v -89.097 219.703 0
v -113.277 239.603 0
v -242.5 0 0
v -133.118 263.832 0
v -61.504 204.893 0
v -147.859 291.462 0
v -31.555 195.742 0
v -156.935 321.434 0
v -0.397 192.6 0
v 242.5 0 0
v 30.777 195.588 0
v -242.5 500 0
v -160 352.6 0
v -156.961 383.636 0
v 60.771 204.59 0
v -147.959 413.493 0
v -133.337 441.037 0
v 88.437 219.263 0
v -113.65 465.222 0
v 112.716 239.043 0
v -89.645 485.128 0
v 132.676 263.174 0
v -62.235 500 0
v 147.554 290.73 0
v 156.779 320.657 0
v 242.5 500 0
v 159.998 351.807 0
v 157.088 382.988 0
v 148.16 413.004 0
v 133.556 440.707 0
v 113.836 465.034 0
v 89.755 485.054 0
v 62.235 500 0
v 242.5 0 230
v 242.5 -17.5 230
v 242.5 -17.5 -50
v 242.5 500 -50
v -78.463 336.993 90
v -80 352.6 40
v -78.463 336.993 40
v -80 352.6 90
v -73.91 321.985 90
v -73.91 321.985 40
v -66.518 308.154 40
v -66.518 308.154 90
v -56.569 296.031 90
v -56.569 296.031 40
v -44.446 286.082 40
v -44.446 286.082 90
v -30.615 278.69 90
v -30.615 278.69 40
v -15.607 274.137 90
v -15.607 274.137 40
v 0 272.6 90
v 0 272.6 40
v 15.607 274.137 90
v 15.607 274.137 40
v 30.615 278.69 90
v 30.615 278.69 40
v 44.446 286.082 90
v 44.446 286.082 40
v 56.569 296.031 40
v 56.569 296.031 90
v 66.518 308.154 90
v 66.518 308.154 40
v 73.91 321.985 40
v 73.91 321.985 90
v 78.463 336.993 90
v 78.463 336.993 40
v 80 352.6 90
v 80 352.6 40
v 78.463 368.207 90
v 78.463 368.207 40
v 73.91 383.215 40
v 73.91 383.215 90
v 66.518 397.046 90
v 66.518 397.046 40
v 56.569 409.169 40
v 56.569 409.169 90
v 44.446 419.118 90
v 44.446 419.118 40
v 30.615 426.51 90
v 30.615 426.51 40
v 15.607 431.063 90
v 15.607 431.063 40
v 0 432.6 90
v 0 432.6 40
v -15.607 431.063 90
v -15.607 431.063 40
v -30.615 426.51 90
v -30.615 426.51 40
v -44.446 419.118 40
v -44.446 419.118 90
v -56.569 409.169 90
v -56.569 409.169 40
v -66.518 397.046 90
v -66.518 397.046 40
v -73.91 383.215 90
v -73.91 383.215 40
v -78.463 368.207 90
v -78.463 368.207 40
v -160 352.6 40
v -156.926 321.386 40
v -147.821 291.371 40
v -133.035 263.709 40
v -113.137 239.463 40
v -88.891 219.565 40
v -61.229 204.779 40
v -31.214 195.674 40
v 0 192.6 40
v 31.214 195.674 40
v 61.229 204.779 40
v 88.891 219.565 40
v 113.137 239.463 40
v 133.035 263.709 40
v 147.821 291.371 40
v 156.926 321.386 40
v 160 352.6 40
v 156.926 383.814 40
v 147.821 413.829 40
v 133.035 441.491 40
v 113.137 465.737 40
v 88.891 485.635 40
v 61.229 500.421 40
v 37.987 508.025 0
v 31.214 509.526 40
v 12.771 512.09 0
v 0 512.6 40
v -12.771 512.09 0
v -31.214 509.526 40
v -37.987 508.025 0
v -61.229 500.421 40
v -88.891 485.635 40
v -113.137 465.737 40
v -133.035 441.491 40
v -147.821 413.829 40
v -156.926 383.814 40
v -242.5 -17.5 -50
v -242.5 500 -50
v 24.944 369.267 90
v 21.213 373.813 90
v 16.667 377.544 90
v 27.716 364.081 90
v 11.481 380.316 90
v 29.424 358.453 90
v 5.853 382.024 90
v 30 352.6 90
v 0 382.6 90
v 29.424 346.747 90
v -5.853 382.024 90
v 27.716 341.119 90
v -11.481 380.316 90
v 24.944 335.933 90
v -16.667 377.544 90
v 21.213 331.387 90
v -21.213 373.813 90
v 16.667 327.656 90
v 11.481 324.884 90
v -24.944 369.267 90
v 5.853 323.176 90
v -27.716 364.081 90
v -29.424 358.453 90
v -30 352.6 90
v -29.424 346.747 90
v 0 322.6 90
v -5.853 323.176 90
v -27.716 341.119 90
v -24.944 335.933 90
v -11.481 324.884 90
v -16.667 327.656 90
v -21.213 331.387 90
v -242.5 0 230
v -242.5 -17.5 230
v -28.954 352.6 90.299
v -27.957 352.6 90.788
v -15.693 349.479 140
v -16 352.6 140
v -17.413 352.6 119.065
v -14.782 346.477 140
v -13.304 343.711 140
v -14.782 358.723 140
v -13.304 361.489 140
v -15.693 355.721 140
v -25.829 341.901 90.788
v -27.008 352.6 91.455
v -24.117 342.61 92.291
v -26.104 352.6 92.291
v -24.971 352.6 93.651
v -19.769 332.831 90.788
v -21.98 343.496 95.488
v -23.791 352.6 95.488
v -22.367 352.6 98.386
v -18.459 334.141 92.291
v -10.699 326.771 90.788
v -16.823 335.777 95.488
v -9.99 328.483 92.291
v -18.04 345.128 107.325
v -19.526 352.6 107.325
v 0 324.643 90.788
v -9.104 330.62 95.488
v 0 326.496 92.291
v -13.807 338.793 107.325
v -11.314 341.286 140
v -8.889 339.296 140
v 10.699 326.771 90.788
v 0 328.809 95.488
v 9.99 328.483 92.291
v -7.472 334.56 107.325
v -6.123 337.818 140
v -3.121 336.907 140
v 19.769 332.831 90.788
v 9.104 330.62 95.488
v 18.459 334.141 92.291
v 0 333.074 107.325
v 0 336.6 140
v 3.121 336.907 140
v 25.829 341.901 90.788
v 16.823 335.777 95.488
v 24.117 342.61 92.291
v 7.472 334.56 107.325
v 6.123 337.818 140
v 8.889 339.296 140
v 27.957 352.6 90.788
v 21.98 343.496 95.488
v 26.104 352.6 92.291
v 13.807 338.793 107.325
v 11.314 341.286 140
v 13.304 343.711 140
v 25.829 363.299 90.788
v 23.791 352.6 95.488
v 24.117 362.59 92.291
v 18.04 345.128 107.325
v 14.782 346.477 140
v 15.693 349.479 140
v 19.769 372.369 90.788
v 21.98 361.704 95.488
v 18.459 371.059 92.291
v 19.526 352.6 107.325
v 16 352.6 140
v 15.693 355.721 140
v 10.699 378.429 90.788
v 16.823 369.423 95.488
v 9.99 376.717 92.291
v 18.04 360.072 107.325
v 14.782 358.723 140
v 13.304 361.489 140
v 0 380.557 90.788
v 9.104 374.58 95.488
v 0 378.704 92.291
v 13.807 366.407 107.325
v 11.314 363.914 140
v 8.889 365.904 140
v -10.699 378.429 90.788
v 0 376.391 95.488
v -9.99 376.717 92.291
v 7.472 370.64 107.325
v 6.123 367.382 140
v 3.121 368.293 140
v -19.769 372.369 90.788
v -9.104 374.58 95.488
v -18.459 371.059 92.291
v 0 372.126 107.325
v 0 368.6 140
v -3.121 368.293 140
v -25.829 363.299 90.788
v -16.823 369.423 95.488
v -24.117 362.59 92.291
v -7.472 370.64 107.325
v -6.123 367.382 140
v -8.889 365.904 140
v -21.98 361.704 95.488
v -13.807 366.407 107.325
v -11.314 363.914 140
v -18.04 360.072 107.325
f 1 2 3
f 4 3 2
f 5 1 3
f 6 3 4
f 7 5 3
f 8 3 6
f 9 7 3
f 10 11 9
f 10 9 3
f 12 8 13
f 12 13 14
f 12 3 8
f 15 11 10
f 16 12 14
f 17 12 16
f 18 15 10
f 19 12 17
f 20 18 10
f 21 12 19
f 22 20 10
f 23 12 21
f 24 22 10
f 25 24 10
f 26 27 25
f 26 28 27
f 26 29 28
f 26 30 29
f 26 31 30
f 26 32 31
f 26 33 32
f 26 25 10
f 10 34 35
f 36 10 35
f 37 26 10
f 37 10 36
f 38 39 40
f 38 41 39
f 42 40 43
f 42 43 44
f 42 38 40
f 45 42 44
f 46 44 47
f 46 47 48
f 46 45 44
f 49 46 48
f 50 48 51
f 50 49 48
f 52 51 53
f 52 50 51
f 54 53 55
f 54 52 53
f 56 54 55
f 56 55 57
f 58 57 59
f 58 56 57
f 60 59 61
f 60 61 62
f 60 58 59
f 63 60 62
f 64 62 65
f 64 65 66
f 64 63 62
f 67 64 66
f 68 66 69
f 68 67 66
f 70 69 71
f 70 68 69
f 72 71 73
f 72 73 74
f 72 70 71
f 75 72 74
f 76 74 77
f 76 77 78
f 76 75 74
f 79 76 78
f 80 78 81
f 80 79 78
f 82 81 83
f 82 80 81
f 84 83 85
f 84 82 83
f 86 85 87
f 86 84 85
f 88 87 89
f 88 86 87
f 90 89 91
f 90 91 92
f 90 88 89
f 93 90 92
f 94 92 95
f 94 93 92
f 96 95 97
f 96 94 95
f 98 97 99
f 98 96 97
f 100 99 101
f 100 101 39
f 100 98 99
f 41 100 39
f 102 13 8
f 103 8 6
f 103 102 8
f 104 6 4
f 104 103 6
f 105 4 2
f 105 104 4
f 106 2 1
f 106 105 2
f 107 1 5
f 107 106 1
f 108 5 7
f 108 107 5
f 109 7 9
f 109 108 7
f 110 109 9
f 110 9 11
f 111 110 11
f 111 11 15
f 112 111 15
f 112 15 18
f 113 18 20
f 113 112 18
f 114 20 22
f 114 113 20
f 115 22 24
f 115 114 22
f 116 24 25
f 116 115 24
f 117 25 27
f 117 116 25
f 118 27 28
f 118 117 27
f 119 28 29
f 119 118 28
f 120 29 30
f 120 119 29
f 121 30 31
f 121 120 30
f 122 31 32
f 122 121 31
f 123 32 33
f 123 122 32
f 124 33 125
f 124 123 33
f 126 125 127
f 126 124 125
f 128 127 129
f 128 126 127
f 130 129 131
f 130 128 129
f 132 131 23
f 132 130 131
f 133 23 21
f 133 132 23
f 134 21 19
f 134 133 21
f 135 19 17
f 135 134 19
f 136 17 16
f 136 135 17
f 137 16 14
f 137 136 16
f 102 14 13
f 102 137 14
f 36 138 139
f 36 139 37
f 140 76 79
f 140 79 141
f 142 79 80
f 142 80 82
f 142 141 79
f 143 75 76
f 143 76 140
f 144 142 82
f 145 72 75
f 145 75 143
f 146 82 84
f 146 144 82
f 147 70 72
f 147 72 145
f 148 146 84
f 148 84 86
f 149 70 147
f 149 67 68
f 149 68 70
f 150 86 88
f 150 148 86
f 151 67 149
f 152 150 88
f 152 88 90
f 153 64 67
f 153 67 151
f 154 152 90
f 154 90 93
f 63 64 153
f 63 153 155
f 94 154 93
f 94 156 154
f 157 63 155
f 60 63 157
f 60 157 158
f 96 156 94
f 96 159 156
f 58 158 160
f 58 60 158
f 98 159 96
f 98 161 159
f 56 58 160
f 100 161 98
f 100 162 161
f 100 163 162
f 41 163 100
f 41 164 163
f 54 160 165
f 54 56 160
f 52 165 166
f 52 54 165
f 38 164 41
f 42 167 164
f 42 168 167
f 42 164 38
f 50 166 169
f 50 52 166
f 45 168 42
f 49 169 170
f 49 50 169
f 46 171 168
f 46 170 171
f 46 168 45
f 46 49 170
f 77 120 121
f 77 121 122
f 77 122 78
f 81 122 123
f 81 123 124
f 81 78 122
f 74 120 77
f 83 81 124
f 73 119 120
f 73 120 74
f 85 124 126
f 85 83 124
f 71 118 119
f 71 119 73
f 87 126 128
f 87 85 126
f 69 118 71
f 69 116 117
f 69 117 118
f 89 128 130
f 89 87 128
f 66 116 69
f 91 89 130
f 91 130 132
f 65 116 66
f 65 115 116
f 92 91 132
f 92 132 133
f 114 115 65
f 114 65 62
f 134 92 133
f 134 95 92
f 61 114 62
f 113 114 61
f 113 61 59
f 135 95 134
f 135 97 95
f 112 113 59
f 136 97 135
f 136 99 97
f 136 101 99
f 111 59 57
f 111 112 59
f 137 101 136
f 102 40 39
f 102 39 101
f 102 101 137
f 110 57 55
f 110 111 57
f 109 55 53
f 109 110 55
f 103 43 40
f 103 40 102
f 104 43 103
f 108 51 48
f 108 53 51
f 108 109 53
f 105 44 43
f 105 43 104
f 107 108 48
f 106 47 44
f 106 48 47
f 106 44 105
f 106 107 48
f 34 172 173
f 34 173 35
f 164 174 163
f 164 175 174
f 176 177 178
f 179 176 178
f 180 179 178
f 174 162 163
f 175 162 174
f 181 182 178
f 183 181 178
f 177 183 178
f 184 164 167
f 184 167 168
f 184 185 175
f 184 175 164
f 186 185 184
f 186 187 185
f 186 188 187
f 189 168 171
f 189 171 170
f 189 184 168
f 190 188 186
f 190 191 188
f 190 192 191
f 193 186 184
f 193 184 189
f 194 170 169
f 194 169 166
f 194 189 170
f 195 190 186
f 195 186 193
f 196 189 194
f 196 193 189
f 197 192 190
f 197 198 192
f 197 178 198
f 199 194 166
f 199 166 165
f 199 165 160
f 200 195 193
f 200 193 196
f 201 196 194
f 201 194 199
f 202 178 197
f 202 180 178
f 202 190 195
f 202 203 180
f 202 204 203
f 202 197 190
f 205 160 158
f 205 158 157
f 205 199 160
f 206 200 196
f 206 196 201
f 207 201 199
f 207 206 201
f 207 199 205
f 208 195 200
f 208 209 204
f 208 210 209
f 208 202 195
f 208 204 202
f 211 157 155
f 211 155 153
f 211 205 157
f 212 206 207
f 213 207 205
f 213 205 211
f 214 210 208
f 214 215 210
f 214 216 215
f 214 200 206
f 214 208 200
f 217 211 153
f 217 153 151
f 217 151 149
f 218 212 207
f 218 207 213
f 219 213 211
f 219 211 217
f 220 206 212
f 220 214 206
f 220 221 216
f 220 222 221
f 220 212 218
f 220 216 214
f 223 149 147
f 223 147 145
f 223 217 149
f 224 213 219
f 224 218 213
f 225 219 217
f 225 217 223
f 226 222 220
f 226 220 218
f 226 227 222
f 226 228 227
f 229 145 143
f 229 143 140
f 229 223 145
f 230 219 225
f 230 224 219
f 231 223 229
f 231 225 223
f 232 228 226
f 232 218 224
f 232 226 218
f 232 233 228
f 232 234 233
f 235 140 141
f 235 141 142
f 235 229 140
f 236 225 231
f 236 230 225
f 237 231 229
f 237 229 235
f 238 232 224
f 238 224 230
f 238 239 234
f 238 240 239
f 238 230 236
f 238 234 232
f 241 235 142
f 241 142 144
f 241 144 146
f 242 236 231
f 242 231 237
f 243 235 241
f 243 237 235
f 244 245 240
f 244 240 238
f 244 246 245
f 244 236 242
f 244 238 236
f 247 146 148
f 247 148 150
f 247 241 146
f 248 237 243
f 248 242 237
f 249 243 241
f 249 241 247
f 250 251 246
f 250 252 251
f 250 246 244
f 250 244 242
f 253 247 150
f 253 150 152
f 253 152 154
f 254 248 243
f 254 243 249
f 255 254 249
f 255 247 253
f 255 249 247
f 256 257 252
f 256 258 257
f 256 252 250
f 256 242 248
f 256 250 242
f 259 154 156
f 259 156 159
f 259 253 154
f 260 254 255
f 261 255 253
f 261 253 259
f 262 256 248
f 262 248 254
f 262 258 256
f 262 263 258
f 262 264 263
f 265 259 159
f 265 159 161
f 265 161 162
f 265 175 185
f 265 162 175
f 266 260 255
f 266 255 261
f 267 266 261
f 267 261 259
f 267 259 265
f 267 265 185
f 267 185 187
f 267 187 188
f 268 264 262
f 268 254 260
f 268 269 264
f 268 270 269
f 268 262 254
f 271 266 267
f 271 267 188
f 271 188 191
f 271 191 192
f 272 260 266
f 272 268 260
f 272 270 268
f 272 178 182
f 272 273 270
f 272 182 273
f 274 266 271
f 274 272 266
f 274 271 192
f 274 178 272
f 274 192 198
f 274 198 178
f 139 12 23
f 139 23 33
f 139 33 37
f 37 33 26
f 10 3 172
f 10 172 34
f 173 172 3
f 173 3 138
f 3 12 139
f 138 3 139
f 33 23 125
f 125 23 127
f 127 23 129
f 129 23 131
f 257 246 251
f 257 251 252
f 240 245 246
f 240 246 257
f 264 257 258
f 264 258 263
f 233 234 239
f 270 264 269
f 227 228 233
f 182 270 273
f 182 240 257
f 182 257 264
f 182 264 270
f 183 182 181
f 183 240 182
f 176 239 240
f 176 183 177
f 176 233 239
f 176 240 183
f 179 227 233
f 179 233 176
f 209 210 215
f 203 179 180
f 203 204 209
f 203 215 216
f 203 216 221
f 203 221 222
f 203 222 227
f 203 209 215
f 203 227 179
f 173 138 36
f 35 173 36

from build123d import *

# Parameters (mm, degrees)
SKETCH1_W           = 485
SKETCH1_H           = 500
BOSS_EXTRUDE1_DEPTH = 50
SKETCH2_W           = 485
SKETCH2_H           = 280
BOSS_EXTRUDE2_DEPTH = 17.5


with BuildPart() as part:
    # Sketch1 → Boss-Extrude1 (new body)
    with BuildSketch(Plane.XY):
        with Locations((0, 250)):
            Rectangle(SKETCH1_W, SKETCH1_H)
    extrude(amount=-BOSS_EXTRUDE1_DEPTH)

    # Sketch2 → Boss-Extrude2 (add)
    with BuildSketch(Plane(origin=(0, 0, 0), x_dir=(1, 0, 0), z_dir=(0, 1, 0))):
        with Locations((0, -90)):
            Rectangle(SKETCH2_W, SKETCH2_H)
    extrude(amount=-BOSS_EXTRUDE2_DEPTH)

    # Sketch6 → Revolve1 (revolve)
    with BuildSketch(Plane(origin=(0, 352.6, 0), x_dir=(1, 0, 0), z_dir=(0, 1, 0)), mode=Mode.PRIVATE) as revolve1_sk:
        with BuildLine():
            Line((0, 0), (160, 0))
            Line((160, 0), (160, -40))
            Line((160, -40), (80, -40))
            Line((80, -40), (80, -90))
            Line((80, -90), (30, -90))
            add(Edge.make_bspline(
                [(30, -90), (19.305392217, -92.013307308), (16, -123.873269223), (16, -140)],
                knots=[0, 0, 0, 0, 1, 1, 1, 1], degree=3))
            Line((16, -140), (15.691041026, -140))
            Line((15.691041026, -140), (0, -140))
            Line((0, -140), (0, 0))
        make_face()
    revolve(revolve1_sk.sketch.rotate(Axis((0, 352.6, 0), (0, 0, 1)), 180), axis=Axis((0, 352.6, 0), (0, 0, 1)))


solid = part.part
